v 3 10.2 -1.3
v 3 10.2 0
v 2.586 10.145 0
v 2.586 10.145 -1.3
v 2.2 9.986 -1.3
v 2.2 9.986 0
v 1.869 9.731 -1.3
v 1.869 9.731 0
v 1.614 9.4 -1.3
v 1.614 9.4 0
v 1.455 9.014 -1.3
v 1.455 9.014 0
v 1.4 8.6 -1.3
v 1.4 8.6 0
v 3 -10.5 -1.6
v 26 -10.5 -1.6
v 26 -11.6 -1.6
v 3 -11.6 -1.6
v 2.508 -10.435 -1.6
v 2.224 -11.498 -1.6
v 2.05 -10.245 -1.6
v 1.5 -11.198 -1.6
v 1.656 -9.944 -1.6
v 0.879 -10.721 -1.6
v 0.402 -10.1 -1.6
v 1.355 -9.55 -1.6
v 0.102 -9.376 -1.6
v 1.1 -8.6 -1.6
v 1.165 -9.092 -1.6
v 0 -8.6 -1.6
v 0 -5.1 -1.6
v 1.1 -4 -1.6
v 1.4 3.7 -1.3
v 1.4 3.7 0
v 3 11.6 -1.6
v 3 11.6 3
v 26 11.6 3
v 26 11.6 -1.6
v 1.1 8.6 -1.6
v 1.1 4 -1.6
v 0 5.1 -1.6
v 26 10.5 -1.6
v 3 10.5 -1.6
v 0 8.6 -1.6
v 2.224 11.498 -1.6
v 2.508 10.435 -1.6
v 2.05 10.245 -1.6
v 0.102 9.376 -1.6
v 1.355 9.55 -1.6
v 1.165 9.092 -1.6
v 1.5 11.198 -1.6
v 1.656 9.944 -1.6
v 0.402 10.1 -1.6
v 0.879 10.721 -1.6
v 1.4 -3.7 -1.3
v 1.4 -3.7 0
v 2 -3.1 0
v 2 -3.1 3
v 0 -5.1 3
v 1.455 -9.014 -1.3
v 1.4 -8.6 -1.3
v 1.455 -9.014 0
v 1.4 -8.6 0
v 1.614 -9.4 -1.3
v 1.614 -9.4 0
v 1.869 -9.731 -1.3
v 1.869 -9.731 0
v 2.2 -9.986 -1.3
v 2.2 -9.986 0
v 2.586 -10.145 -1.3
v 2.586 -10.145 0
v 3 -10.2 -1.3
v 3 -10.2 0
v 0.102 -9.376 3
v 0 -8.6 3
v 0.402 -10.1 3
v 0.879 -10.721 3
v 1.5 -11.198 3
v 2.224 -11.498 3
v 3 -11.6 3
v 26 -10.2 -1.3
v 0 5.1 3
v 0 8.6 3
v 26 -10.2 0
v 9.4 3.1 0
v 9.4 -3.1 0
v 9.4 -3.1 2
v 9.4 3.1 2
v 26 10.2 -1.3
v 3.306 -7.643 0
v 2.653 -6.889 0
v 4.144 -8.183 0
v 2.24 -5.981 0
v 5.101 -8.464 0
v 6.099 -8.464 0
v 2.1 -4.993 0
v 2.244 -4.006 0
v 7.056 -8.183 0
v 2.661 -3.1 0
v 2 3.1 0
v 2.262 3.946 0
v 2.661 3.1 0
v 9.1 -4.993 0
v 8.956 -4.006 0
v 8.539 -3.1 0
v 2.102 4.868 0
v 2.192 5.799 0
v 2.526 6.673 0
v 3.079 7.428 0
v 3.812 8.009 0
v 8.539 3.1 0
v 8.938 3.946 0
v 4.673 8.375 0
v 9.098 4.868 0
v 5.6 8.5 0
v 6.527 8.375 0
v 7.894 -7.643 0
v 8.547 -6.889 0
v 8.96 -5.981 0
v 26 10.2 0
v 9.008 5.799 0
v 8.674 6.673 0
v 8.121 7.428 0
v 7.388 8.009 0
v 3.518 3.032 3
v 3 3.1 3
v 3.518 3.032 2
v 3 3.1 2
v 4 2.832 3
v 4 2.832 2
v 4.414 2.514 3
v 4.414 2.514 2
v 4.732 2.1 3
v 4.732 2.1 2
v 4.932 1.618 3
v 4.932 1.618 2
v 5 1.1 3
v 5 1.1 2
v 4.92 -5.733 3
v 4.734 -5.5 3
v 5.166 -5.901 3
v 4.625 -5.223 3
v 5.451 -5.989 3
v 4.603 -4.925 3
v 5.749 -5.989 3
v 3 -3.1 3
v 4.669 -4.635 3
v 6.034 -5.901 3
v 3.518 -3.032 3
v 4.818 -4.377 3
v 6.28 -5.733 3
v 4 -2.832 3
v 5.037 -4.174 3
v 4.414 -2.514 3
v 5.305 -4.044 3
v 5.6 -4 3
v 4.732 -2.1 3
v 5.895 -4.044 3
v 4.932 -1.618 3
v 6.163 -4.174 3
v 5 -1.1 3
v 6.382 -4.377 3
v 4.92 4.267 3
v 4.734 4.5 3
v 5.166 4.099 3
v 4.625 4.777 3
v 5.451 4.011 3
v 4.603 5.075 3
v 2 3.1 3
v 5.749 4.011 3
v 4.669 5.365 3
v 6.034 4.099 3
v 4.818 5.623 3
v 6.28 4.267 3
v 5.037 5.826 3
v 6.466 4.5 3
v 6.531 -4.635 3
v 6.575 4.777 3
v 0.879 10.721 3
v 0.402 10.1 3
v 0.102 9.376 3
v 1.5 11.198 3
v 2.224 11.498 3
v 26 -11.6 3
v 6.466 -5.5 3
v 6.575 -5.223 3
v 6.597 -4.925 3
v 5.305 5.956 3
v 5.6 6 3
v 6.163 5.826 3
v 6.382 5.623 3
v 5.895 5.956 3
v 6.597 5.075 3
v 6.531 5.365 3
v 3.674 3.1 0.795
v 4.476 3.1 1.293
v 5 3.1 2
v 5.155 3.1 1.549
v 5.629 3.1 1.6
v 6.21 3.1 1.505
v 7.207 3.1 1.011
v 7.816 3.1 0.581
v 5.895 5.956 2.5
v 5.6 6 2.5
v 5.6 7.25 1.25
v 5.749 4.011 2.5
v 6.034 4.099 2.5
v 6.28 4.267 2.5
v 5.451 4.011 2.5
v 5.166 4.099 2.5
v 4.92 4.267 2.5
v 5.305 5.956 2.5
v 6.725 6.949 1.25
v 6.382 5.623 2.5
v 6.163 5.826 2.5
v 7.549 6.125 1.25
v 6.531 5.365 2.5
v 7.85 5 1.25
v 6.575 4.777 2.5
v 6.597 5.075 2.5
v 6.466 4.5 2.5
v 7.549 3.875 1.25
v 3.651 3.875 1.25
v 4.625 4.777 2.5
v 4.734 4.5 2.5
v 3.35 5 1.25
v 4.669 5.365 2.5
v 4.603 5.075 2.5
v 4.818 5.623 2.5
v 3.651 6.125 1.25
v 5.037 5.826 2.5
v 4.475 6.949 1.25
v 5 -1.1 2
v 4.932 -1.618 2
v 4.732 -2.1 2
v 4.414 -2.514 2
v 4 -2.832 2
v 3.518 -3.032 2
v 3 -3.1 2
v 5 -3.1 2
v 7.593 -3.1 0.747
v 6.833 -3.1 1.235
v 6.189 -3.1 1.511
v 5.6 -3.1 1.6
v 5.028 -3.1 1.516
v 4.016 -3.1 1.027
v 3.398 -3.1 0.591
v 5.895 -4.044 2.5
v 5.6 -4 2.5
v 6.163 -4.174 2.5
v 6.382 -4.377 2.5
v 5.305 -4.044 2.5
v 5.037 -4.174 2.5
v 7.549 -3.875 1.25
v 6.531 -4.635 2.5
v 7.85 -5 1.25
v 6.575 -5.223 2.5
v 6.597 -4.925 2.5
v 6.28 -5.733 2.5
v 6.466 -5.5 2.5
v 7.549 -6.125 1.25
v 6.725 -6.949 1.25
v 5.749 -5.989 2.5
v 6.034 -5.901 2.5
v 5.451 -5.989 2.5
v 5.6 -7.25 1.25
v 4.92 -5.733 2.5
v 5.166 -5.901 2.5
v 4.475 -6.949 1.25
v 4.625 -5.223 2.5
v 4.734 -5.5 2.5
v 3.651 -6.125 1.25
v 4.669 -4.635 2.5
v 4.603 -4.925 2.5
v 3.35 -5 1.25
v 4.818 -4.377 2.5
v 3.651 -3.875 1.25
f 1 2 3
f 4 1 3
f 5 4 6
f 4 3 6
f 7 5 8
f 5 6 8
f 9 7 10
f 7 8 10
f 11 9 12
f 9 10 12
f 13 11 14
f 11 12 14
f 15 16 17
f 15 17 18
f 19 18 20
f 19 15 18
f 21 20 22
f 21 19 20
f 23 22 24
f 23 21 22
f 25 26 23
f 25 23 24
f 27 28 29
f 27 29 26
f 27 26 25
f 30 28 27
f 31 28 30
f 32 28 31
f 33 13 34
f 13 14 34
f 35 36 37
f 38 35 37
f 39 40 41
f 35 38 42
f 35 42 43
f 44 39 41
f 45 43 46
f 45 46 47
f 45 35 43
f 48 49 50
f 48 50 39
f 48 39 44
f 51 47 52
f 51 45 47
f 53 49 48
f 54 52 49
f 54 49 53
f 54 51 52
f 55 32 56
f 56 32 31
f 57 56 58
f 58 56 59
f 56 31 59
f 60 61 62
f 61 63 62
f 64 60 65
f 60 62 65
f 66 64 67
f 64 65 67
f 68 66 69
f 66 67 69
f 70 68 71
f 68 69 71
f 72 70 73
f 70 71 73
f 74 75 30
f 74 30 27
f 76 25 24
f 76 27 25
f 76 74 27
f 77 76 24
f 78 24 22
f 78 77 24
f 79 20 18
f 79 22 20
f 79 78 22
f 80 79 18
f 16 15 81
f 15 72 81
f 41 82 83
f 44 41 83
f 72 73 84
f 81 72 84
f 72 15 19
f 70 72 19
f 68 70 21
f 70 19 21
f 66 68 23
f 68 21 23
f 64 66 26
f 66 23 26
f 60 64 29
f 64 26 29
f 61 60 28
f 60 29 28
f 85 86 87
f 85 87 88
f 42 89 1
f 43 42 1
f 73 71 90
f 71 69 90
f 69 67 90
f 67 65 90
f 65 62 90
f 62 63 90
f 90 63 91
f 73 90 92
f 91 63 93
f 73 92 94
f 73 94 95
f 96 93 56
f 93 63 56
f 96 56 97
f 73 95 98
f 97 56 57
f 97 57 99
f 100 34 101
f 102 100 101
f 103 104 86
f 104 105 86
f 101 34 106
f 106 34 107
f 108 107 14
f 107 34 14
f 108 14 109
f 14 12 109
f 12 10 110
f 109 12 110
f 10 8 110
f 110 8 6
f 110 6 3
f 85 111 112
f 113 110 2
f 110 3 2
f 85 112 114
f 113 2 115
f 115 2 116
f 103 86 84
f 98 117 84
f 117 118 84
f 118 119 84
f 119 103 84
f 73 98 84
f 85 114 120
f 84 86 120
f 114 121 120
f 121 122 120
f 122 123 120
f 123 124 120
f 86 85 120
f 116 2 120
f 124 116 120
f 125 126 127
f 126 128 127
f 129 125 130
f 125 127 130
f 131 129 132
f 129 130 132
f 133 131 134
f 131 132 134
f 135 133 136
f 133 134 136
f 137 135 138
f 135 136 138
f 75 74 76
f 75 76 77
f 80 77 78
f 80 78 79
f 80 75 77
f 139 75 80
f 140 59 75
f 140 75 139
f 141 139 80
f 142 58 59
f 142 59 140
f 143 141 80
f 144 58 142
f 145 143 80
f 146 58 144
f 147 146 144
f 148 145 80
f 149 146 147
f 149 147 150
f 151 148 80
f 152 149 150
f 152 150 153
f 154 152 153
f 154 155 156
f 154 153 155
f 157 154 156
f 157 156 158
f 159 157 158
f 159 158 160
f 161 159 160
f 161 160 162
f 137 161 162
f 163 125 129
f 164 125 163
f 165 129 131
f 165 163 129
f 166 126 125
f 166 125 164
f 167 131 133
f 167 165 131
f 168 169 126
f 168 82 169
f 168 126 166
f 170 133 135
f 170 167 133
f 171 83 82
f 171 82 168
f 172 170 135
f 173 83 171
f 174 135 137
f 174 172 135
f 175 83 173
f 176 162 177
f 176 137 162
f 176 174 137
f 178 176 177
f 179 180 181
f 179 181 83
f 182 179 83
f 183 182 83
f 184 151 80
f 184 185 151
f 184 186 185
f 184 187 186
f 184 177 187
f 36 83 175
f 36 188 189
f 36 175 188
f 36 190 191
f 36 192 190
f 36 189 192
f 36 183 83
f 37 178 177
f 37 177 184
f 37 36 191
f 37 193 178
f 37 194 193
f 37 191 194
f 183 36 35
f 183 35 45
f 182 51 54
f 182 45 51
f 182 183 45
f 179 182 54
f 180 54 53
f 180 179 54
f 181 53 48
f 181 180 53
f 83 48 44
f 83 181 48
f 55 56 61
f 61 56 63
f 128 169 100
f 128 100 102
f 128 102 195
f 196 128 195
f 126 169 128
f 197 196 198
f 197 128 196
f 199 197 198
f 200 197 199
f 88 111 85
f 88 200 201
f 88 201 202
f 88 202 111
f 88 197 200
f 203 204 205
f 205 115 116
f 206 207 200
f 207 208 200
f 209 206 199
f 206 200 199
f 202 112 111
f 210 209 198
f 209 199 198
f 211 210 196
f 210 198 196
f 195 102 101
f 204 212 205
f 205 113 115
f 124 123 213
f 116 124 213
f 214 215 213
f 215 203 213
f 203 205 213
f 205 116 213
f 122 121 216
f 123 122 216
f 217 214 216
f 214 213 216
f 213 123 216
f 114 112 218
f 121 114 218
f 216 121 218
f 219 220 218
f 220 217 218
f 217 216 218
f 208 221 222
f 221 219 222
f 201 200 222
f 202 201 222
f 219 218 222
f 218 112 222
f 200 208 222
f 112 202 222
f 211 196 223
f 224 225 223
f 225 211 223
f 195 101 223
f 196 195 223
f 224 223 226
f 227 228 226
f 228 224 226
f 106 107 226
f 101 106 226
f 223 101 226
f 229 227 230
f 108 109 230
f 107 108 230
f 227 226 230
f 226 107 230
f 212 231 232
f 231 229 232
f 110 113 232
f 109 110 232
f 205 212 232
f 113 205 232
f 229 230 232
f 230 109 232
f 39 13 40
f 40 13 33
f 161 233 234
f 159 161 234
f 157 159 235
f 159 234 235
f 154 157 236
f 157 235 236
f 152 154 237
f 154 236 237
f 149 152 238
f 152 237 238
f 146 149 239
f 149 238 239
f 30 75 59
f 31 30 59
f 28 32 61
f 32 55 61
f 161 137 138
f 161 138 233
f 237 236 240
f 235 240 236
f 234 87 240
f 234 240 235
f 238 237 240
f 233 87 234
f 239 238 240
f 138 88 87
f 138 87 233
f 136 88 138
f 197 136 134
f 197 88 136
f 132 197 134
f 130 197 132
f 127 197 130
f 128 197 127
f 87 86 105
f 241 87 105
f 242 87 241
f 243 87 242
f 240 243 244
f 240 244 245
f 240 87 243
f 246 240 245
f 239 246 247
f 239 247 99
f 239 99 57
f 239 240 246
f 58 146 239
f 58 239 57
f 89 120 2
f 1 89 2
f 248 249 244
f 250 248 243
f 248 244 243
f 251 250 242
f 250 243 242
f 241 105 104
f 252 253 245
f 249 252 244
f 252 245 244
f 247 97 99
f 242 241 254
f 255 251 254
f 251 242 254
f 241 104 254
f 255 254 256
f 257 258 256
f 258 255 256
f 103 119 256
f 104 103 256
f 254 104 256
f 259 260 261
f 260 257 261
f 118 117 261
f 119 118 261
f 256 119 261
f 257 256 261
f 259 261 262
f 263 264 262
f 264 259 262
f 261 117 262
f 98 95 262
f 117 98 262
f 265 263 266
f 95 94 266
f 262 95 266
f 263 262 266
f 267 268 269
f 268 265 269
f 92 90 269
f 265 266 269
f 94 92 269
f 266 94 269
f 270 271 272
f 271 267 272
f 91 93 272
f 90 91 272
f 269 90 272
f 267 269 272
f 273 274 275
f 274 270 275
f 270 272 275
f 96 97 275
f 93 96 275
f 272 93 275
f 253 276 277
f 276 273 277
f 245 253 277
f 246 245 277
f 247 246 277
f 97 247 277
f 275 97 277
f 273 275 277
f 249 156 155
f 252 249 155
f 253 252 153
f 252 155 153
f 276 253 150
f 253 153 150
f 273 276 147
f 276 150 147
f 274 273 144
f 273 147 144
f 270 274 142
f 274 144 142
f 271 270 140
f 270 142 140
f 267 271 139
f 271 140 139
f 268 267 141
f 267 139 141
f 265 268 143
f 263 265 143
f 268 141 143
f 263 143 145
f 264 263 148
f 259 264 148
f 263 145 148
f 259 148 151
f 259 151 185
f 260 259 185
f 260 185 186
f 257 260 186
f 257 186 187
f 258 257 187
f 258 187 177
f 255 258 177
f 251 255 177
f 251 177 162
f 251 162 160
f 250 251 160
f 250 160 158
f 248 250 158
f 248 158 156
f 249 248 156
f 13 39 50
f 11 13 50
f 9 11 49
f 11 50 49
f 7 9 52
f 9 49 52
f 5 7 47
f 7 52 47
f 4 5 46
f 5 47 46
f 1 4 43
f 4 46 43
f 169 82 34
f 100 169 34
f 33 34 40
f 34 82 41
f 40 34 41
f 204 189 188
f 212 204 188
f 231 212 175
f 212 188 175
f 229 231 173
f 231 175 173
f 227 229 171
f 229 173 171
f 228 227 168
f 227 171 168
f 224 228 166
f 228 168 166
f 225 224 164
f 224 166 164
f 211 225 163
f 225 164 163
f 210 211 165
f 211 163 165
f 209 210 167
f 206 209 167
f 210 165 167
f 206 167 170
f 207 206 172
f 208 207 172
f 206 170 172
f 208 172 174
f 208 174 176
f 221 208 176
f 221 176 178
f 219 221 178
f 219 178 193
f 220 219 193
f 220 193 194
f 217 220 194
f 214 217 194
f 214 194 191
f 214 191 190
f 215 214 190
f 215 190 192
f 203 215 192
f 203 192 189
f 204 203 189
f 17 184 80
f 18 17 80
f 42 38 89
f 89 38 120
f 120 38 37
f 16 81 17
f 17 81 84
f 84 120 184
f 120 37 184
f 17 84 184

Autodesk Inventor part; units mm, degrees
ref_plane "YZ Plane" through (0, 0, 0) normal (1, 0, 0) x (0, 1, 0)
ref_plane "XZ Plane" through (0, 0, 0) normal (0, 1, 0) x (-1, 0, 0)
ref_plane "XY Plane" through (0, 0, 0) normal (0, 0, 1) x (1, 0, 0)
sketch "Skizze1" plane through (0, 0, 0) normal (0, 0, 1) x (1, 0, 0)
  line L0 (3, 11.6) -> (26, 11.6)
  line L1 (26, 11.6) -> (26, -11.6)
  line L2 (26, -11.6) -> (3, -11.6)
  line L3 (0, -8.6) -> (0, 8.6)
  line L4 (-5.9456, 0) -> (31.3243, 0) projected
  arc A0 (3, 11.6) -> (0, 8.6) centre (3, 8.6) ccw
  arc A1 (0, -8.6) -> (3, -11.6) centre (3, -8.6) ccw
  point P0 (0, 0)
  point P1 (0, 11.6)
  dimension "d0" = 23.2
  dimension "d1" = 26
  dimension "d2" = 3
extrude "Extrusion1" add sketch "Skizze1" along normal blind 3
sketch "Skizze2" plane through (0, 0, 0) normal (0, 0, -1) x (-1, 0, 0)
  line L0 (0, -8.6) -> (0, 8.6) projected
  arc A0 (0, 8.6) -> (-3, 11.6) centre (-3, 8.6) ccw projected
  line L1 (-3, 11.6) -> (-26, 11.6) projected
  line L2 (-26, 11.6) -> (-26, -11.6) projected
  line L3 (-26, -11.6) -> (-3, -11.6) projected
  arc A1 (-3, -11.6) -> (0, -8.6) centre (-3, -8.6) ccw projected
  line L4 (-3, -10.2) -> (-26, -10.2)
  line L5 (-26, -10.2) -> (-26, 10.2)
  line L6 (-26, 10.2) -> (-3, 10.2)
  arc A2 (-1.4, 8.6) -> (-3, 10.2) centre (-3, 8.6) ccw
  line L7 (-1.4, 8.6) -> (-1.4, -8.6)
  arc A3 (-3, -10.2) -> (-1.4, -8.6) centre (-3, -8.6) ccw
  line L8 (0, -8.6) -> (0, 8.6) projected
  point P0 (0, 0)
  dimension "d8" = 1.4
extrude "Extrusion2" add sketch "Skizze2" along normal blind 1.6 contours A1 L3 L2 L4 A3 L7 A2 L6 L1 A0 L0
sketch "Skizze3" plane through (0, 0, 3) normal (0, 0, 1) x (1, 0, 0)
  line L0 (0, 8.6) -> (0, -8.6) projected
  arc A0 (0, -8.6) -> (3, -11.6) centre (3, -8.6) ccw projected
  line L1 (3, -11.6) -> (26, -11.6) projected
  line L2 (26, -11.6) -> (26, 11.6) projected
  line L3 (26, 11.6) -> (3, 11.6) projected
  arc A1 (3, 11.6) -> (0, 8.6) centre (3, 8.6) ccw projected
  line L4 (0, 8.6) -> (0, -8.6) projected
  line L5 (0, 3.1) -> (5, 3.1)
  line L6 (5, 3.1) -> (5, -3.1)
  line L7 (5, -3.1) -> (0, -3.1)
  line L8 (0, -3.1) -> (0, 3.1)
  line L9 (-5.6971, 0) -> (31.2828, 0) projected
  point P0 (0, 0)
  dimension "d9" = 8.5
  dimension "d10" = 5
extrude "Extrusion3" cut sketch "Skizze3" against normal through all contours L5 L6 L9 L0 | L9 L6 L7 L0
sketch "Skizze5" plane through (0, 0, 0) normal (0, 0, -1) x (-1, 0, 0)
  line L0 (-5, -3.1) -> (-5, 3.1) projected
  line L1 (-31.2, 0) -> (5.2, 0) projected
  line L2 (-5, 3.1) -> (-5, -3.1) projected
  line L3 (-5, -3.1) -> (-9.4, -3.1)
  line L4 (-9.4, -3.1) -> (-9.4, 3.1)
  line L5 (-9.4, 3.1) -> (-5, 3.1)
  line L6 (-5, 3.1) -> (-5, -3.1)
  line L7 (-1.4, -8.6) -> (-1.4, -3.1) projected
  point P0 (0, 0)
  dimension "d23" = 8
extrude "Extrusion4" cut sketch "Skizze5" against normal blind 2
sketch "Skizze4" plane through (0, 0, 0) normal (0, 0, -1) x (-1, 0, 0)
  line L0 (0, -16.24) -> (0, 16.24) projected
  line L1 (-31.2, 0) -> (5.2, 0) projected
  line L2 (-1.4, -3.1) -> (-1.4, -8.6) projected
  point P0 (0, 0)
  point P1 (-5.6, -5)
  point P2 (-5.6, 5)
  dimension "d13" = 10
  dimension "d15" = 4.2
hole "Bohrung1" at (5.6, -5, 0) at (5.6, 5, 0) direction (0, 0, 1) diameter 2 end through all countersink diameter 7 countersink angle 90
fillet "Rundung1" radius 2 2 edges at (5, 3.1, 2.5) (5, -3.1, 2.5)
sketch "Skizze6" plane through (0, 0, -1.6) normal (0, 0, -1) x (-1, 0, 0)
  line L0 (0, -3.1) -> (-1.4, -3.1) projected
  line L1 (-1.4, -3.1) -> (-1.4, -8.6) projected
  arc A0 (-3, -10.2) -> (-1.4, -8.6) centre (-3, -8.6) ccw projected
  line L2 (-3, -10.2) -> (-26, -10.2) projected
  line L3 (-26, -10.2) -> (-26, -11.6) projected
  line L4 (-26, -11.6) -> (-3, -11.6) projected
  arc A1 (-3, -11.6) -> (0, -8.6) centre (-3, -8.6) ccw projected
  line L5 (0, -8.6) -> (0, -3.1) projected
  line L6 (-1.4, 3.1) -> (0, 3.1) projected
  line L7 (0, 3.1) -> (0, 8.6) projected
  arc A2 (0, 8.6) -> (-3, 11.6) centre (-3, 8.6) ccw projected
  line L8 (-3, 11.6) -> (-26, 11.6) projected
  line L9 (-26, 11.6) -> (-26, 10.2) projected
  line L10 (-26, 10.2) -> (-3, 10.2) projected
  arc A3 (-1.4, 8.6) -> (-3, 10.2) centre (-3, 8.6) ccw projected
  line L11 (-1.4, 8.6) -> (-1.4, 3.1) projected
  line L12 (-3, -11.6) -> (-26, -11.6) projected
  line L13 (-26, -10.2) -> (-3, -10.2) projected
  line L14 (-26, -11.6) -> (-21, -11.6)
  line L15 (-21, -11.6) -> (-21, -10.2)
  line L16 (-21, -10.2) -> (-26, -10.2)
  line L17 (-26, -10.2) -> (-26, -11.6)
  point P0 (0, 0)
  dimension "d27" = 5
extrude "Extrusion5" [suppressed]
sketch "Skizze8" plane through (26, -11.6, 3) normal (1, 0, 0) x (0, 0, -1)
  line L0 (0, 23.2) -> (4.6, 23.2) projected
  line L1 (0, 0) -> (0, 23.2) projected
  line L2 (0, 0) -> (4.6, 0) projected
  line L3 (4.6, 1.4) -> (3, 1.4) projected
  line L4 (3, 21.8) -> (3, 1.4) projected
  line L5 (3, 21.8) -> (4.6, 21.8) projected
  line L6 (4.6, 23.2) -> (4.6, 21.8) projected
  line L7 (6.6, 1.4) -> (5.5, 2.0351)
  line L8 (5.5, 2.0351) -> (4.4, 1.4)
  line L9 (6.6, 1.4) -> (3, 1.4) projected
  line L10 (5.5, 2.0351) -> (5.5, 1.4) construction
  line L11 (6.6, 1.4) -> (4.4, 1.4)
  line L12 (4.6, 1.4) -> (4.6, 0) projected
  point P0 (3, 11.6)
  dimension "d30" = 2.2
  dimension "d34" = 30
extrude "Extrusion6" [suppressed]
sketch "Skizze9" plane through (0, 0, -1.6) normal (0, 0, -1) x (-1, 0, 0)
  line L0 (-26, -11.6) -> (-3, -11.6) projected
  arc A0 (-3, -11.6) -> (0, -8.6) centre (-3, -8.6) ccw projected
  line L1 (0, -8.6) -> (0, -3.1) projected
  line L2 (0, -3.1) -> (-1.4, -3.1) projected
  line L3 (-1.4, -3.1) -> (-1.4, -8.6) projected
  arc A1 (-3, -10.2) -> (-1.4, -8.6) centre (-3, -8.6) ccw projected
  line L4 (-3, -10.2) -> (-26, -10.2) projected
  line L5 (-26, -11.6) -> (-3, -11.6) projected
  line L6 (-21, -11.6) -> (-20, -11.6)
  line L7 (-20, -11.6) -> (-20, -9.2)
  line L8 (-20, -9.2) -> (-21, -9.2)
  line L9 (-21, -10.6) -> (-21, -11.6)
  line L10 (-20, -9.2) -> (-26, -9.2)
  line L11 (-26, -9.2) -> (-26, -10.6)
  line L12 (-20, -10.2) -> (-20, -9.2)
  line L13 (-21, -10.6) -> (-26, -10.6)
  line L14 (-26, -10.2) -> (-26, -11.6) projected
  point P0 (0, 0)
  dimension "d40" = 1
  dimension "d41" = 1.4
extrude "Extrusion7" [suppressed]
mirror "Spiegeln1" [suppressed]
chamfer "Fase1" [suppressed]
chamfer "Fase2" distance 0.3 angle 45 6 edges at (14.5, -10.2, -1.6) (1.8686, -9.7314, -1.6) (1.4, -5.85, -1.6) (14.5, 10.2, -1.6) (1.8686, 9.7314, -1.6) (1.4, 5.85, -1.6)
chamfer "Fase3" distance 2 angle 45 2 edges at (0, 3.1, 0.7) (0, -3.1, 0.7)
properties part number "Kondensatorschutz" material "PC/ABS-Kunststoff"
